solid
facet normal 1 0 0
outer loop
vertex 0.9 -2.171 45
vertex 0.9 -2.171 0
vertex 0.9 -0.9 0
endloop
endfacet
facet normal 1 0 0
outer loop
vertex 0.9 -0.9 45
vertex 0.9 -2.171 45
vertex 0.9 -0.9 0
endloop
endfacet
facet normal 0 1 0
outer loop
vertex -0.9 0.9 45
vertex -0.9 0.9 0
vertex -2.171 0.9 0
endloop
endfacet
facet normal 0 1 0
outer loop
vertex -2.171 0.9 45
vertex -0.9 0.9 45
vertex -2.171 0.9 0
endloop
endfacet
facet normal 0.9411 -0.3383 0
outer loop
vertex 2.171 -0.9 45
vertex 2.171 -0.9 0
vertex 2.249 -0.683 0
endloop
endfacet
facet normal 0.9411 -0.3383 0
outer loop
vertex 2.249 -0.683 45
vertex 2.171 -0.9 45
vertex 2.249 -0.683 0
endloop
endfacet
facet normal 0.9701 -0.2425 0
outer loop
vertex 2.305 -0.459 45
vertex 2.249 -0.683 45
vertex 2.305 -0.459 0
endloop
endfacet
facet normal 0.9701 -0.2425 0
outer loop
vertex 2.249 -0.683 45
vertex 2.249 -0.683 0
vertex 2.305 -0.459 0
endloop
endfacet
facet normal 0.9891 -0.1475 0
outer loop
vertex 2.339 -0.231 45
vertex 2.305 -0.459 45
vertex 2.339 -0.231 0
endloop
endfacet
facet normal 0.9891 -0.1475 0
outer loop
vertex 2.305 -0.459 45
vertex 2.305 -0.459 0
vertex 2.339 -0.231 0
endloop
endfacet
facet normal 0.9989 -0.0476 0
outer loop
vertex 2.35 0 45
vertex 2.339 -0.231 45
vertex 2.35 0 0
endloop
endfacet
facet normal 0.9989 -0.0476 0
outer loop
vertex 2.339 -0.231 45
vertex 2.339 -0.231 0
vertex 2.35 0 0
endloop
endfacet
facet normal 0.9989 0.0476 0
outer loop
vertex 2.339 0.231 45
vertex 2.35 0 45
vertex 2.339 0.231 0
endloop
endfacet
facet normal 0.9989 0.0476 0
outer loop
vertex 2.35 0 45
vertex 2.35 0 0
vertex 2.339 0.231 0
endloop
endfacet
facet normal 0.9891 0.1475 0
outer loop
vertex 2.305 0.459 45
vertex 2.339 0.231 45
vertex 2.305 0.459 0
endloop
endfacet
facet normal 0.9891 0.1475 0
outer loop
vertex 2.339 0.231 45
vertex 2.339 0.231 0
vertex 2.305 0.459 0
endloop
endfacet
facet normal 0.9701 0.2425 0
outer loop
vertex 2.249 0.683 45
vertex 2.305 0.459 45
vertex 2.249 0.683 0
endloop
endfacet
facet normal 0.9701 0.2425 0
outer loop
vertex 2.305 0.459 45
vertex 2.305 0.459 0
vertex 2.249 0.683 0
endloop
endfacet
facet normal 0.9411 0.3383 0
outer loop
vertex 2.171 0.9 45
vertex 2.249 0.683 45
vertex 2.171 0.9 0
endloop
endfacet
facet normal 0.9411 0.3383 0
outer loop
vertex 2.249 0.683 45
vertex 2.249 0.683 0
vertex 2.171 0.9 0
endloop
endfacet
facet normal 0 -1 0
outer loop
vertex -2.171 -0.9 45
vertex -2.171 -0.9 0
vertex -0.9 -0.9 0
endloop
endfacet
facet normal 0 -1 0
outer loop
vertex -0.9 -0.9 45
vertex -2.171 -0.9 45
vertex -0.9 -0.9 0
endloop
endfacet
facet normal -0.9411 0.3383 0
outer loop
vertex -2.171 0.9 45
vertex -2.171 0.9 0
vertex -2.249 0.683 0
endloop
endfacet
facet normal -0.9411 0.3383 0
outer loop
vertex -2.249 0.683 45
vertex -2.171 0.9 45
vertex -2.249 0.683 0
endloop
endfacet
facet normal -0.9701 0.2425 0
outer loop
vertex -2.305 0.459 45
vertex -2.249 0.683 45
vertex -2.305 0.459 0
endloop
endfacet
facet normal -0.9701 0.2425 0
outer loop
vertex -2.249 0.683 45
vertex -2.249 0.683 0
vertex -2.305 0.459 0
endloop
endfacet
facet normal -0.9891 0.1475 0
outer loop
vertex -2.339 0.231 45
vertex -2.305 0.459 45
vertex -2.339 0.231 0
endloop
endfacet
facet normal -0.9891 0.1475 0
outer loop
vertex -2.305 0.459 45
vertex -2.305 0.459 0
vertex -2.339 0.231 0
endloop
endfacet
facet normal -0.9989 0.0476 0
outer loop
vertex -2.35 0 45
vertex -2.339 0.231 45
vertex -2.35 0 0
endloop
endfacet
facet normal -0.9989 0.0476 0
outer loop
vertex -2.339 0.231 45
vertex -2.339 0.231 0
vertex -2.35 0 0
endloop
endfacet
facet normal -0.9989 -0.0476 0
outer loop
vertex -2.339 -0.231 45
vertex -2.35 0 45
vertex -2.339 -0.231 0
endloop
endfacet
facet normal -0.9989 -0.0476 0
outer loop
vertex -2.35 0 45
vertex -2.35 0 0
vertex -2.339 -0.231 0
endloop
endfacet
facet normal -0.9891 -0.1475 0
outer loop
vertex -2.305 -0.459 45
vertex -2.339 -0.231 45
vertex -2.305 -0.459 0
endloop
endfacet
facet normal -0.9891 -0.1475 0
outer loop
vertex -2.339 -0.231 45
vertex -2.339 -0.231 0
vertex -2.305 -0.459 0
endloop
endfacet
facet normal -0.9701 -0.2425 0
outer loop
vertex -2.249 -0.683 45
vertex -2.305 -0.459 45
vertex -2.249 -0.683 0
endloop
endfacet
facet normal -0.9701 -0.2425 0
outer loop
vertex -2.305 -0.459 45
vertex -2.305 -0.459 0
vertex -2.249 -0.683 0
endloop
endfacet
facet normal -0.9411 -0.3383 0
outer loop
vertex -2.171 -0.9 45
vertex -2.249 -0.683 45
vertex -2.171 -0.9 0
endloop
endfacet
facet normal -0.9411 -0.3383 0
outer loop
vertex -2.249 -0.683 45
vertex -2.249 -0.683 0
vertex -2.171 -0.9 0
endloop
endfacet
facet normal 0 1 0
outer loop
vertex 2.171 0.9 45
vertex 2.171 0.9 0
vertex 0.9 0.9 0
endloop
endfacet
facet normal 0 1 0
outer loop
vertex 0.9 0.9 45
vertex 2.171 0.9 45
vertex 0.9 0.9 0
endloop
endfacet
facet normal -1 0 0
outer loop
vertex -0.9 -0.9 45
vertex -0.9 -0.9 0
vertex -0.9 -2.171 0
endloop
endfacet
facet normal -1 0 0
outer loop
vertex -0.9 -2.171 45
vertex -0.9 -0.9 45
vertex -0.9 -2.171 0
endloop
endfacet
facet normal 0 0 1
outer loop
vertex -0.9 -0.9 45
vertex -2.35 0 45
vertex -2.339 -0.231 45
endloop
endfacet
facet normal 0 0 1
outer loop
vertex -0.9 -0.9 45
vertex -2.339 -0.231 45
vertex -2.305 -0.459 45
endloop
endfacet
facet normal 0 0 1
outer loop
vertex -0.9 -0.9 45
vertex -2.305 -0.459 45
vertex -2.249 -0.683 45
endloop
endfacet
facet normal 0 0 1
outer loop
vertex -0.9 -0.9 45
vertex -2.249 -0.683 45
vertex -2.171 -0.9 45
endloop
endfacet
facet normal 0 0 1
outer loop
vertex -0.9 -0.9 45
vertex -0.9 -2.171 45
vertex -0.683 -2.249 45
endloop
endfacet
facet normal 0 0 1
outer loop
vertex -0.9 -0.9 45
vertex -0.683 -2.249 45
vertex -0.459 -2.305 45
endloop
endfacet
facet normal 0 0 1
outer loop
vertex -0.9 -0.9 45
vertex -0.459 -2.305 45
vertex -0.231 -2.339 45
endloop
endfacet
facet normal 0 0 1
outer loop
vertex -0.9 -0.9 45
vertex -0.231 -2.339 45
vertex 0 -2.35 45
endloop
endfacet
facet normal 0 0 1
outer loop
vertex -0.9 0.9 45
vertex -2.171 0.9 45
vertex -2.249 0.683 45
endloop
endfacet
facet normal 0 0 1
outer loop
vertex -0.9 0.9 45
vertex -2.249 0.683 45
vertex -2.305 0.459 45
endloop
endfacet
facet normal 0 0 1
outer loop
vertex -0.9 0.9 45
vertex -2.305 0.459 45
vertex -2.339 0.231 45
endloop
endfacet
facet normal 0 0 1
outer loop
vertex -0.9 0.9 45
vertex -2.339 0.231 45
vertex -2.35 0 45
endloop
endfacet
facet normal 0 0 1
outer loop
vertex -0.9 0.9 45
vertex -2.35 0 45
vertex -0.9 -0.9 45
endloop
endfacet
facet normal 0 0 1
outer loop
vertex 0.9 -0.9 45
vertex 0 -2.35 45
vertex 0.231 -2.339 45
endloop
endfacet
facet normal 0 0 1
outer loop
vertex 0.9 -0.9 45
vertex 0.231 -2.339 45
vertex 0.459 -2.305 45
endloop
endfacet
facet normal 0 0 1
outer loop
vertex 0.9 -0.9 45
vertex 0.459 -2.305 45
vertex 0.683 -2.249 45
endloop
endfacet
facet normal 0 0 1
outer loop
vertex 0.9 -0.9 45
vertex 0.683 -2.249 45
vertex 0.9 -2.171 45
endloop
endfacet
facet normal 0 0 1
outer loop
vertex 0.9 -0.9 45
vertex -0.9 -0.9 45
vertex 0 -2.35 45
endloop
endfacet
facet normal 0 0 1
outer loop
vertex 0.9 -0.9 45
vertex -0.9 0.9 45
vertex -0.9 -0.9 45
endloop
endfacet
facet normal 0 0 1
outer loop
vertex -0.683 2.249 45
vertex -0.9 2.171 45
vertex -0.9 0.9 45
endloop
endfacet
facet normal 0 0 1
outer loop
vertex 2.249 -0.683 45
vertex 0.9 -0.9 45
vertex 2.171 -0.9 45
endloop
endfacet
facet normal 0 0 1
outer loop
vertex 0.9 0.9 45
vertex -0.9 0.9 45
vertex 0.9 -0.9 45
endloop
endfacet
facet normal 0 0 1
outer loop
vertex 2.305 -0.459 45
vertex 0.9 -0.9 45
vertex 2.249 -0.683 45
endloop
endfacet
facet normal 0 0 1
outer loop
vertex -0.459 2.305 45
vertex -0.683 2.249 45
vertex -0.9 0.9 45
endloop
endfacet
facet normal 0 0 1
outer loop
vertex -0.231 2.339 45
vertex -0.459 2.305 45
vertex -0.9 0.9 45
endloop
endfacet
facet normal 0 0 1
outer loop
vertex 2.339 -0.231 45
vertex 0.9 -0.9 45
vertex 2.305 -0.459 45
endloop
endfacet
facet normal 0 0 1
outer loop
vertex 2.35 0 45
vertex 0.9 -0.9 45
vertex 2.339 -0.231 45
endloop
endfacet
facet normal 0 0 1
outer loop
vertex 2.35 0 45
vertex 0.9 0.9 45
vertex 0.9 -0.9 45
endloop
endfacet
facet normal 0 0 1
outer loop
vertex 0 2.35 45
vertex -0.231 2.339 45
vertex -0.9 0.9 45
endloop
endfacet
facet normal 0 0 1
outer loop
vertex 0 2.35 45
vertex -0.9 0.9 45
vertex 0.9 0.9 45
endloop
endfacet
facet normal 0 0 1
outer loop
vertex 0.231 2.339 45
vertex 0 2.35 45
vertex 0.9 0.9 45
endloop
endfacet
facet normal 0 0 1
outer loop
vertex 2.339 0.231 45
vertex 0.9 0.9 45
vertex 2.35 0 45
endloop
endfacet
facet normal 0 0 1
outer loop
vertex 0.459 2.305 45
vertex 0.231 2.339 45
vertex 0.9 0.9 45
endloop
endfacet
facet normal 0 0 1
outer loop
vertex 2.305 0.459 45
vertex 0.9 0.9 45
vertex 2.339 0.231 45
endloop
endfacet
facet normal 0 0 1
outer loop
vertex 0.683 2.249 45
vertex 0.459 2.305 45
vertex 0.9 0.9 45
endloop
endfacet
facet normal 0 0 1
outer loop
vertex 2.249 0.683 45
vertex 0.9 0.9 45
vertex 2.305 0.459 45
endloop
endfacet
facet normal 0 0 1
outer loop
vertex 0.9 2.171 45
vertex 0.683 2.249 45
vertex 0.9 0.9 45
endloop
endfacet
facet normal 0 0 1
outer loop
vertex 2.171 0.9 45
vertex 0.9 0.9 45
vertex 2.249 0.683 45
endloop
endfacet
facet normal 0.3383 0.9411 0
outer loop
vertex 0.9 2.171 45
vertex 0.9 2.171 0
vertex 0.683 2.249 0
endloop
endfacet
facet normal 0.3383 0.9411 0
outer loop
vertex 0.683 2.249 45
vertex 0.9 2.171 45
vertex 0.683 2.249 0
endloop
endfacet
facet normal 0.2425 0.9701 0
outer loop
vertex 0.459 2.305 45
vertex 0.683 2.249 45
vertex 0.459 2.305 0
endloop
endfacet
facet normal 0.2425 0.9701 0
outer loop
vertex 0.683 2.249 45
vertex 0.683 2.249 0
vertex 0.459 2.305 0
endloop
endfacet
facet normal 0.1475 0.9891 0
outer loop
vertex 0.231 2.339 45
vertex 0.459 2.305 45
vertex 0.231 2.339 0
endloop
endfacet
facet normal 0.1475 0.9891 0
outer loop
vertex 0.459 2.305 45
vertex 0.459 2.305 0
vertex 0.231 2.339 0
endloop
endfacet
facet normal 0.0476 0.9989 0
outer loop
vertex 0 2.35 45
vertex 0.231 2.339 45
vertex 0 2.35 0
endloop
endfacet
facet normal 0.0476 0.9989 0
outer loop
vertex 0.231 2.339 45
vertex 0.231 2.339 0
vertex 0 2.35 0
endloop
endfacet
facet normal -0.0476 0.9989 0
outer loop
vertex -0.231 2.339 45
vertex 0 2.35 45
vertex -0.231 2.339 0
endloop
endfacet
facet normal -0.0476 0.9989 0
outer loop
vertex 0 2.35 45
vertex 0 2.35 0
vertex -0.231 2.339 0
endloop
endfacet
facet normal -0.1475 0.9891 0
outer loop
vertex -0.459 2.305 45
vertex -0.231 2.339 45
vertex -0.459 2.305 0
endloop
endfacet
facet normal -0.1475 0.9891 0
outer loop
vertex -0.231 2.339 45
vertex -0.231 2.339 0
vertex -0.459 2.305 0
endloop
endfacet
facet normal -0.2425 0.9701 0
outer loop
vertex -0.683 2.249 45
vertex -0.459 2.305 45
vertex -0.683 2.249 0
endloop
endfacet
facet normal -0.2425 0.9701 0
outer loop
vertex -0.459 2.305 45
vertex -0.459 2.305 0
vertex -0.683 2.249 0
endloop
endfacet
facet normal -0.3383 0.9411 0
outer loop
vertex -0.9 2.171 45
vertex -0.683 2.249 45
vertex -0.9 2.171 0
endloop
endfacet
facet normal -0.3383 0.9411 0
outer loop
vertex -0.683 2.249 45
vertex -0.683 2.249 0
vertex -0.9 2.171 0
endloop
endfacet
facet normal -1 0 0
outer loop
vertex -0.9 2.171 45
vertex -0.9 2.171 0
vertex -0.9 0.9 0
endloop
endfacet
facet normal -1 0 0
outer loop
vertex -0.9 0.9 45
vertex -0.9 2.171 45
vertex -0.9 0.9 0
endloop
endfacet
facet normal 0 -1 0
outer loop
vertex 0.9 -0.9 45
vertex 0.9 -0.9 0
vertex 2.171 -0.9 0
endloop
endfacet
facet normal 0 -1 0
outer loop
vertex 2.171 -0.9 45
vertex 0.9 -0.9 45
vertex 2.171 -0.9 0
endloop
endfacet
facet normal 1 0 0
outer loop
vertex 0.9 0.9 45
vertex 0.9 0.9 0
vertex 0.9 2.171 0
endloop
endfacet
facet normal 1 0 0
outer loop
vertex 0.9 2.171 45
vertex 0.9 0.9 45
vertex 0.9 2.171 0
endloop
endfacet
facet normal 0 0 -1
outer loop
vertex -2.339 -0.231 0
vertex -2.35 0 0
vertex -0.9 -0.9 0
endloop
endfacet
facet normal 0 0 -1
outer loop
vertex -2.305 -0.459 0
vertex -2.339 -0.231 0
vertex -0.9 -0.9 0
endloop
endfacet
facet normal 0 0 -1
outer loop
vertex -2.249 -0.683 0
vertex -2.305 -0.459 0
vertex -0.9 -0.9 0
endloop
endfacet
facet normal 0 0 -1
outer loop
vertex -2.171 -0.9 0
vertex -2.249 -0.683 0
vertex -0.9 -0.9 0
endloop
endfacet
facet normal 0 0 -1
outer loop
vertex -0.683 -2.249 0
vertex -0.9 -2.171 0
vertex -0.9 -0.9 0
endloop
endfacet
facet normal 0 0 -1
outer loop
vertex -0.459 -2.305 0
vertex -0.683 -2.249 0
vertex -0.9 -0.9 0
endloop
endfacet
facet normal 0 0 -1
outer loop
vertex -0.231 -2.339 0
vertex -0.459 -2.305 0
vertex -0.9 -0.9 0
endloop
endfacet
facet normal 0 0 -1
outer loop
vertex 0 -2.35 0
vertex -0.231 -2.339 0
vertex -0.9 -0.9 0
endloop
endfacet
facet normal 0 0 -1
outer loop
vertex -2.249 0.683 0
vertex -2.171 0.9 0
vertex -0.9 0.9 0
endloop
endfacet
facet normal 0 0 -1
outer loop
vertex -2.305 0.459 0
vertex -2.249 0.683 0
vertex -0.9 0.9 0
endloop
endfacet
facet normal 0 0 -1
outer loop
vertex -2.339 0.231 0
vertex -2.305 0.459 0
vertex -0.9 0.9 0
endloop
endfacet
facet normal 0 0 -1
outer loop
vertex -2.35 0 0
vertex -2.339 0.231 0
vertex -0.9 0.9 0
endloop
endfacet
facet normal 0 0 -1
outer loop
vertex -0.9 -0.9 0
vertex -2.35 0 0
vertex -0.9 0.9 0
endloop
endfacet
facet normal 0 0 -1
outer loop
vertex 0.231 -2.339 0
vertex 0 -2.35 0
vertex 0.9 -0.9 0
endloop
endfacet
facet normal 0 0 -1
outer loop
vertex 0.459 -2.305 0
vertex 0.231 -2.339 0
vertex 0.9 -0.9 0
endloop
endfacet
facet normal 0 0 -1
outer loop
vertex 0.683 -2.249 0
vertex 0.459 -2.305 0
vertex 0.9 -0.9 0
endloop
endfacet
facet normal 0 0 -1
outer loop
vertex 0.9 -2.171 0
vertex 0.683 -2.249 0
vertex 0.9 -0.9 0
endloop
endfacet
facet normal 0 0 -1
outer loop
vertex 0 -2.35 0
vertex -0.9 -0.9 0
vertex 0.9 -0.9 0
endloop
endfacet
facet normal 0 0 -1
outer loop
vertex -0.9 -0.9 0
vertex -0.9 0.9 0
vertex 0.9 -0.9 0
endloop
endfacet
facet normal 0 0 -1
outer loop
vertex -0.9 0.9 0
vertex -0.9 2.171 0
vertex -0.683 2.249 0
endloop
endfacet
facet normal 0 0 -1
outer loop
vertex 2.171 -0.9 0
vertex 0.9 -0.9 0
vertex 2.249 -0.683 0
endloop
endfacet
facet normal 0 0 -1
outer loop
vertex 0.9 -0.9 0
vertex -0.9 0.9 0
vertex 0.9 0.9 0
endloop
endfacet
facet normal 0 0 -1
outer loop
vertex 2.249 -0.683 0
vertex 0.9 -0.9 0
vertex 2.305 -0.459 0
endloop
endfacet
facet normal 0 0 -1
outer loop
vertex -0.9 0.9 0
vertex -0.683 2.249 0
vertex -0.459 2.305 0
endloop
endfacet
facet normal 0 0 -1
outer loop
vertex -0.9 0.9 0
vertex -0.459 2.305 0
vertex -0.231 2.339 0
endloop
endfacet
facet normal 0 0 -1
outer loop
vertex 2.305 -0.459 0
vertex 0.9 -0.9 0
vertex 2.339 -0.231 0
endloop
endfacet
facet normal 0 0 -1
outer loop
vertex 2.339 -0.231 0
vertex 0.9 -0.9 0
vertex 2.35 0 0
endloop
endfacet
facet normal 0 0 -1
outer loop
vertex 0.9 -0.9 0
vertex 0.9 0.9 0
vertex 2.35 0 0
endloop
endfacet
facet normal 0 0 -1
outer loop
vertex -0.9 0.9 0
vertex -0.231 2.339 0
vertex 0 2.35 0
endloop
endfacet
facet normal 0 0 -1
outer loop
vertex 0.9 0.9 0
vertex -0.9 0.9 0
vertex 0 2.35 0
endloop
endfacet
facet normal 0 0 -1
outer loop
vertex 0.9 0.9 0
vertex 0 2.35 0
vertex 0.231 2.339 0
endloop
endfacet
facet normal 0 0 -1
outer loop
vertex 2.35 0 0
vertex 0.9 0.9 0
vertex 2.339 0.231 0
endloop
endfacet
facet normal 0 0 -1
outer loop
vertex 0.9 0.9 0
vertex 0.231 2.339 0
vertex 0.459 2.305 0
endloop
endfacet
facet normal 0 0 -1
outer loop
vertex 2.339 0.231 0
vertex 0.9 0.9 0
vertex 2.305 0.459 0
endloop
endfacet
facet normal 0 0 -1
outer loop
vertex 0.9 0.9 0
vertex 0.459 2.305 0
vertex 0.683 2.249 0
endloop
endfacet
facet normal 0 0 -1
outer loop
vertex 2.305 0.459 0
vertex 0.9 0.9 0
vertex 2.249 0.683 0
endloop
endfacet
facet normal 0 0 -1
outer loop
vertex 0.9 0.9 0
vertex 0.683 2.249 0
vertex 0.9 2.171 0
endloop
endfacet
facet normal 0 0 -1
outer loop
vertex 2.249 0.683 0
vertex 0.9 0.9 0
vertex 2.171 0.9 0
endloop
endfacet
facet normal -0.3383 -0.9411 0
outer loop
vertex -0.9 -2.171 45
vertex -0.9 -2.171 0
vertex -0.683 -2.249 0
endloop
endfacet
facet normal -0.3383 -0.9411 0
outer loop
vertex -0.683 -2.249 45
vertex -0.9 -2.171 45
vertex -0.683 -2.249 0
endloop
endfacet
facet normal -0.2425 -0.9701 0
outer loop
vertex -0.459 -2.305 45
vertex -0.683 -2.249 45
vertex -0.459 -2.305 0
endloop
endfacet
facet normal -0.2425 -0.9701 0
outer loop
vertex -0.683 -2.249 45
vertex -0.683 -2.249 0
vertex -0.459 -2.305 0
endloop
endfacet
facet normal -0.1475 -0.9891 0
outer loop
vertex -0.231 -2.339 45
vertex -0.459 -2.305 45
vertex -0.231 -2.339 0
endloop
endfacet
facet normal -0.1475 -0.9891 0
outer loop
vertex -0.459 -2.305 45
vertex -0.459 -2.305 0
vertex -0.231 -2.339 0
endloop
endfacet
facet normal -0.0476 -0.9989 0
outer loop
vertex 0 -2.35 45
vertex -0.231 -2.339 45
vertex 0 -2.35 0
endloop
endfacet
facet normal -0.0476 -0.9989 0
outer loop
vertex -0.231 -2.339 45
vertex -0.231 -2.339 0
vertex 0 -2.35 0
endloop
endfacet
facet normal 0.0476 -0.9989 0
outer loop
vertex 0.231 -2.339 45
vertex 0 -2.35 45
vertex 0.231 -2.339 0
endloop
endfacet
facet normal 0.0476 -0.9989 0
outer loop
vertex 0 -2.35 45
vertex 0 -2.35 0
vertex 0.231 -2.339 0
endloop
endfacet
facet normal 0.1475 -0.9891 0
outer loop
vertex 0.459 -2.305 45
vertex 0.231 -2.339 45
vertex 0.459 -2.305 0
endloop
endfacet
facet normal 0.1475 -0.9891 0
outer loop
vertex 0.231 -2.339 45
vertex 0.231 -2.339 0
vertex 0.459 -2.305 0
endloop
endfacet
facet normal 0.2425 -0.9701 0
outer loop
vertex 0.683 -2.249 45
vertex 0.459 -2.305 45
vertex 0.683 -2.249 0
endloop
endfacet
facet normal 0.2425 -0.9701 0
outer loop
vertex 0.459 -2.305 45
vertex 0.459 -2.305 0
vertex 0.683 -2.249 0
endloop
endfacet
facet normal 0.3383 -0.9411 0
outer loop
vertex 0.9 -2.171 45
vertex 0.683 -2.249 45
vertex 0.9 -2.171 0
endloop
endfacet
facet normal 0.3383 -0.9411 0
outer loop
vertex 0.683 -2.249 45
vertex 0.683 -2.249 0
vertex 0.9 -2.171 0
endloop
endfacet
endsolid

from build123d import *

# Parameters (mm, degrees)
BOSS_EXTRUDE1_DEPTH = 45


with BuildPart() as part:
    # Sketch1 → Boss-Extrude1 (new body)
    with BuildSketch(Plane.XY):
        with BuildLine():
            Line((-0.9, 2.170829335), (-0.9, 0.9))
            Line((-0.9, 0.9), (-2.170829335, 0.9))
            ThreePointArc((-2.170829335, 0.9), (-2.35, 0), (-2.170829335, -0.9))
            Line((-2.170829335, -0.9), (-0.9, -0.9))
            Line((-0.9, -0.9), (-0.9, -2.170829335))
            ThreePointArc((-0.9, -2.170829335), (0, -2.35), (0.9, -2.170829335))
            Line((0.9, -2.170829335), (0.9, -0.9))
            Line((0.9, -0.9), (2.170829335, -0.9))
            ThreePointArc((2.170829335, -0.9), (2.35, 0), (2.170829335, 0.9))
            Line((2.170829335, 0.9), (0.9, 0.9))
            Line((0.9, 0.9), (0.9, 2.170829335))
            ThreePointArc((0.9, 2.170829335), (0, 2.35), (-0.9, 2.170829335))
        make_face()
    extrude(amount=BOSS_EXTRUDE1_DEPTH)


solid = part.part
